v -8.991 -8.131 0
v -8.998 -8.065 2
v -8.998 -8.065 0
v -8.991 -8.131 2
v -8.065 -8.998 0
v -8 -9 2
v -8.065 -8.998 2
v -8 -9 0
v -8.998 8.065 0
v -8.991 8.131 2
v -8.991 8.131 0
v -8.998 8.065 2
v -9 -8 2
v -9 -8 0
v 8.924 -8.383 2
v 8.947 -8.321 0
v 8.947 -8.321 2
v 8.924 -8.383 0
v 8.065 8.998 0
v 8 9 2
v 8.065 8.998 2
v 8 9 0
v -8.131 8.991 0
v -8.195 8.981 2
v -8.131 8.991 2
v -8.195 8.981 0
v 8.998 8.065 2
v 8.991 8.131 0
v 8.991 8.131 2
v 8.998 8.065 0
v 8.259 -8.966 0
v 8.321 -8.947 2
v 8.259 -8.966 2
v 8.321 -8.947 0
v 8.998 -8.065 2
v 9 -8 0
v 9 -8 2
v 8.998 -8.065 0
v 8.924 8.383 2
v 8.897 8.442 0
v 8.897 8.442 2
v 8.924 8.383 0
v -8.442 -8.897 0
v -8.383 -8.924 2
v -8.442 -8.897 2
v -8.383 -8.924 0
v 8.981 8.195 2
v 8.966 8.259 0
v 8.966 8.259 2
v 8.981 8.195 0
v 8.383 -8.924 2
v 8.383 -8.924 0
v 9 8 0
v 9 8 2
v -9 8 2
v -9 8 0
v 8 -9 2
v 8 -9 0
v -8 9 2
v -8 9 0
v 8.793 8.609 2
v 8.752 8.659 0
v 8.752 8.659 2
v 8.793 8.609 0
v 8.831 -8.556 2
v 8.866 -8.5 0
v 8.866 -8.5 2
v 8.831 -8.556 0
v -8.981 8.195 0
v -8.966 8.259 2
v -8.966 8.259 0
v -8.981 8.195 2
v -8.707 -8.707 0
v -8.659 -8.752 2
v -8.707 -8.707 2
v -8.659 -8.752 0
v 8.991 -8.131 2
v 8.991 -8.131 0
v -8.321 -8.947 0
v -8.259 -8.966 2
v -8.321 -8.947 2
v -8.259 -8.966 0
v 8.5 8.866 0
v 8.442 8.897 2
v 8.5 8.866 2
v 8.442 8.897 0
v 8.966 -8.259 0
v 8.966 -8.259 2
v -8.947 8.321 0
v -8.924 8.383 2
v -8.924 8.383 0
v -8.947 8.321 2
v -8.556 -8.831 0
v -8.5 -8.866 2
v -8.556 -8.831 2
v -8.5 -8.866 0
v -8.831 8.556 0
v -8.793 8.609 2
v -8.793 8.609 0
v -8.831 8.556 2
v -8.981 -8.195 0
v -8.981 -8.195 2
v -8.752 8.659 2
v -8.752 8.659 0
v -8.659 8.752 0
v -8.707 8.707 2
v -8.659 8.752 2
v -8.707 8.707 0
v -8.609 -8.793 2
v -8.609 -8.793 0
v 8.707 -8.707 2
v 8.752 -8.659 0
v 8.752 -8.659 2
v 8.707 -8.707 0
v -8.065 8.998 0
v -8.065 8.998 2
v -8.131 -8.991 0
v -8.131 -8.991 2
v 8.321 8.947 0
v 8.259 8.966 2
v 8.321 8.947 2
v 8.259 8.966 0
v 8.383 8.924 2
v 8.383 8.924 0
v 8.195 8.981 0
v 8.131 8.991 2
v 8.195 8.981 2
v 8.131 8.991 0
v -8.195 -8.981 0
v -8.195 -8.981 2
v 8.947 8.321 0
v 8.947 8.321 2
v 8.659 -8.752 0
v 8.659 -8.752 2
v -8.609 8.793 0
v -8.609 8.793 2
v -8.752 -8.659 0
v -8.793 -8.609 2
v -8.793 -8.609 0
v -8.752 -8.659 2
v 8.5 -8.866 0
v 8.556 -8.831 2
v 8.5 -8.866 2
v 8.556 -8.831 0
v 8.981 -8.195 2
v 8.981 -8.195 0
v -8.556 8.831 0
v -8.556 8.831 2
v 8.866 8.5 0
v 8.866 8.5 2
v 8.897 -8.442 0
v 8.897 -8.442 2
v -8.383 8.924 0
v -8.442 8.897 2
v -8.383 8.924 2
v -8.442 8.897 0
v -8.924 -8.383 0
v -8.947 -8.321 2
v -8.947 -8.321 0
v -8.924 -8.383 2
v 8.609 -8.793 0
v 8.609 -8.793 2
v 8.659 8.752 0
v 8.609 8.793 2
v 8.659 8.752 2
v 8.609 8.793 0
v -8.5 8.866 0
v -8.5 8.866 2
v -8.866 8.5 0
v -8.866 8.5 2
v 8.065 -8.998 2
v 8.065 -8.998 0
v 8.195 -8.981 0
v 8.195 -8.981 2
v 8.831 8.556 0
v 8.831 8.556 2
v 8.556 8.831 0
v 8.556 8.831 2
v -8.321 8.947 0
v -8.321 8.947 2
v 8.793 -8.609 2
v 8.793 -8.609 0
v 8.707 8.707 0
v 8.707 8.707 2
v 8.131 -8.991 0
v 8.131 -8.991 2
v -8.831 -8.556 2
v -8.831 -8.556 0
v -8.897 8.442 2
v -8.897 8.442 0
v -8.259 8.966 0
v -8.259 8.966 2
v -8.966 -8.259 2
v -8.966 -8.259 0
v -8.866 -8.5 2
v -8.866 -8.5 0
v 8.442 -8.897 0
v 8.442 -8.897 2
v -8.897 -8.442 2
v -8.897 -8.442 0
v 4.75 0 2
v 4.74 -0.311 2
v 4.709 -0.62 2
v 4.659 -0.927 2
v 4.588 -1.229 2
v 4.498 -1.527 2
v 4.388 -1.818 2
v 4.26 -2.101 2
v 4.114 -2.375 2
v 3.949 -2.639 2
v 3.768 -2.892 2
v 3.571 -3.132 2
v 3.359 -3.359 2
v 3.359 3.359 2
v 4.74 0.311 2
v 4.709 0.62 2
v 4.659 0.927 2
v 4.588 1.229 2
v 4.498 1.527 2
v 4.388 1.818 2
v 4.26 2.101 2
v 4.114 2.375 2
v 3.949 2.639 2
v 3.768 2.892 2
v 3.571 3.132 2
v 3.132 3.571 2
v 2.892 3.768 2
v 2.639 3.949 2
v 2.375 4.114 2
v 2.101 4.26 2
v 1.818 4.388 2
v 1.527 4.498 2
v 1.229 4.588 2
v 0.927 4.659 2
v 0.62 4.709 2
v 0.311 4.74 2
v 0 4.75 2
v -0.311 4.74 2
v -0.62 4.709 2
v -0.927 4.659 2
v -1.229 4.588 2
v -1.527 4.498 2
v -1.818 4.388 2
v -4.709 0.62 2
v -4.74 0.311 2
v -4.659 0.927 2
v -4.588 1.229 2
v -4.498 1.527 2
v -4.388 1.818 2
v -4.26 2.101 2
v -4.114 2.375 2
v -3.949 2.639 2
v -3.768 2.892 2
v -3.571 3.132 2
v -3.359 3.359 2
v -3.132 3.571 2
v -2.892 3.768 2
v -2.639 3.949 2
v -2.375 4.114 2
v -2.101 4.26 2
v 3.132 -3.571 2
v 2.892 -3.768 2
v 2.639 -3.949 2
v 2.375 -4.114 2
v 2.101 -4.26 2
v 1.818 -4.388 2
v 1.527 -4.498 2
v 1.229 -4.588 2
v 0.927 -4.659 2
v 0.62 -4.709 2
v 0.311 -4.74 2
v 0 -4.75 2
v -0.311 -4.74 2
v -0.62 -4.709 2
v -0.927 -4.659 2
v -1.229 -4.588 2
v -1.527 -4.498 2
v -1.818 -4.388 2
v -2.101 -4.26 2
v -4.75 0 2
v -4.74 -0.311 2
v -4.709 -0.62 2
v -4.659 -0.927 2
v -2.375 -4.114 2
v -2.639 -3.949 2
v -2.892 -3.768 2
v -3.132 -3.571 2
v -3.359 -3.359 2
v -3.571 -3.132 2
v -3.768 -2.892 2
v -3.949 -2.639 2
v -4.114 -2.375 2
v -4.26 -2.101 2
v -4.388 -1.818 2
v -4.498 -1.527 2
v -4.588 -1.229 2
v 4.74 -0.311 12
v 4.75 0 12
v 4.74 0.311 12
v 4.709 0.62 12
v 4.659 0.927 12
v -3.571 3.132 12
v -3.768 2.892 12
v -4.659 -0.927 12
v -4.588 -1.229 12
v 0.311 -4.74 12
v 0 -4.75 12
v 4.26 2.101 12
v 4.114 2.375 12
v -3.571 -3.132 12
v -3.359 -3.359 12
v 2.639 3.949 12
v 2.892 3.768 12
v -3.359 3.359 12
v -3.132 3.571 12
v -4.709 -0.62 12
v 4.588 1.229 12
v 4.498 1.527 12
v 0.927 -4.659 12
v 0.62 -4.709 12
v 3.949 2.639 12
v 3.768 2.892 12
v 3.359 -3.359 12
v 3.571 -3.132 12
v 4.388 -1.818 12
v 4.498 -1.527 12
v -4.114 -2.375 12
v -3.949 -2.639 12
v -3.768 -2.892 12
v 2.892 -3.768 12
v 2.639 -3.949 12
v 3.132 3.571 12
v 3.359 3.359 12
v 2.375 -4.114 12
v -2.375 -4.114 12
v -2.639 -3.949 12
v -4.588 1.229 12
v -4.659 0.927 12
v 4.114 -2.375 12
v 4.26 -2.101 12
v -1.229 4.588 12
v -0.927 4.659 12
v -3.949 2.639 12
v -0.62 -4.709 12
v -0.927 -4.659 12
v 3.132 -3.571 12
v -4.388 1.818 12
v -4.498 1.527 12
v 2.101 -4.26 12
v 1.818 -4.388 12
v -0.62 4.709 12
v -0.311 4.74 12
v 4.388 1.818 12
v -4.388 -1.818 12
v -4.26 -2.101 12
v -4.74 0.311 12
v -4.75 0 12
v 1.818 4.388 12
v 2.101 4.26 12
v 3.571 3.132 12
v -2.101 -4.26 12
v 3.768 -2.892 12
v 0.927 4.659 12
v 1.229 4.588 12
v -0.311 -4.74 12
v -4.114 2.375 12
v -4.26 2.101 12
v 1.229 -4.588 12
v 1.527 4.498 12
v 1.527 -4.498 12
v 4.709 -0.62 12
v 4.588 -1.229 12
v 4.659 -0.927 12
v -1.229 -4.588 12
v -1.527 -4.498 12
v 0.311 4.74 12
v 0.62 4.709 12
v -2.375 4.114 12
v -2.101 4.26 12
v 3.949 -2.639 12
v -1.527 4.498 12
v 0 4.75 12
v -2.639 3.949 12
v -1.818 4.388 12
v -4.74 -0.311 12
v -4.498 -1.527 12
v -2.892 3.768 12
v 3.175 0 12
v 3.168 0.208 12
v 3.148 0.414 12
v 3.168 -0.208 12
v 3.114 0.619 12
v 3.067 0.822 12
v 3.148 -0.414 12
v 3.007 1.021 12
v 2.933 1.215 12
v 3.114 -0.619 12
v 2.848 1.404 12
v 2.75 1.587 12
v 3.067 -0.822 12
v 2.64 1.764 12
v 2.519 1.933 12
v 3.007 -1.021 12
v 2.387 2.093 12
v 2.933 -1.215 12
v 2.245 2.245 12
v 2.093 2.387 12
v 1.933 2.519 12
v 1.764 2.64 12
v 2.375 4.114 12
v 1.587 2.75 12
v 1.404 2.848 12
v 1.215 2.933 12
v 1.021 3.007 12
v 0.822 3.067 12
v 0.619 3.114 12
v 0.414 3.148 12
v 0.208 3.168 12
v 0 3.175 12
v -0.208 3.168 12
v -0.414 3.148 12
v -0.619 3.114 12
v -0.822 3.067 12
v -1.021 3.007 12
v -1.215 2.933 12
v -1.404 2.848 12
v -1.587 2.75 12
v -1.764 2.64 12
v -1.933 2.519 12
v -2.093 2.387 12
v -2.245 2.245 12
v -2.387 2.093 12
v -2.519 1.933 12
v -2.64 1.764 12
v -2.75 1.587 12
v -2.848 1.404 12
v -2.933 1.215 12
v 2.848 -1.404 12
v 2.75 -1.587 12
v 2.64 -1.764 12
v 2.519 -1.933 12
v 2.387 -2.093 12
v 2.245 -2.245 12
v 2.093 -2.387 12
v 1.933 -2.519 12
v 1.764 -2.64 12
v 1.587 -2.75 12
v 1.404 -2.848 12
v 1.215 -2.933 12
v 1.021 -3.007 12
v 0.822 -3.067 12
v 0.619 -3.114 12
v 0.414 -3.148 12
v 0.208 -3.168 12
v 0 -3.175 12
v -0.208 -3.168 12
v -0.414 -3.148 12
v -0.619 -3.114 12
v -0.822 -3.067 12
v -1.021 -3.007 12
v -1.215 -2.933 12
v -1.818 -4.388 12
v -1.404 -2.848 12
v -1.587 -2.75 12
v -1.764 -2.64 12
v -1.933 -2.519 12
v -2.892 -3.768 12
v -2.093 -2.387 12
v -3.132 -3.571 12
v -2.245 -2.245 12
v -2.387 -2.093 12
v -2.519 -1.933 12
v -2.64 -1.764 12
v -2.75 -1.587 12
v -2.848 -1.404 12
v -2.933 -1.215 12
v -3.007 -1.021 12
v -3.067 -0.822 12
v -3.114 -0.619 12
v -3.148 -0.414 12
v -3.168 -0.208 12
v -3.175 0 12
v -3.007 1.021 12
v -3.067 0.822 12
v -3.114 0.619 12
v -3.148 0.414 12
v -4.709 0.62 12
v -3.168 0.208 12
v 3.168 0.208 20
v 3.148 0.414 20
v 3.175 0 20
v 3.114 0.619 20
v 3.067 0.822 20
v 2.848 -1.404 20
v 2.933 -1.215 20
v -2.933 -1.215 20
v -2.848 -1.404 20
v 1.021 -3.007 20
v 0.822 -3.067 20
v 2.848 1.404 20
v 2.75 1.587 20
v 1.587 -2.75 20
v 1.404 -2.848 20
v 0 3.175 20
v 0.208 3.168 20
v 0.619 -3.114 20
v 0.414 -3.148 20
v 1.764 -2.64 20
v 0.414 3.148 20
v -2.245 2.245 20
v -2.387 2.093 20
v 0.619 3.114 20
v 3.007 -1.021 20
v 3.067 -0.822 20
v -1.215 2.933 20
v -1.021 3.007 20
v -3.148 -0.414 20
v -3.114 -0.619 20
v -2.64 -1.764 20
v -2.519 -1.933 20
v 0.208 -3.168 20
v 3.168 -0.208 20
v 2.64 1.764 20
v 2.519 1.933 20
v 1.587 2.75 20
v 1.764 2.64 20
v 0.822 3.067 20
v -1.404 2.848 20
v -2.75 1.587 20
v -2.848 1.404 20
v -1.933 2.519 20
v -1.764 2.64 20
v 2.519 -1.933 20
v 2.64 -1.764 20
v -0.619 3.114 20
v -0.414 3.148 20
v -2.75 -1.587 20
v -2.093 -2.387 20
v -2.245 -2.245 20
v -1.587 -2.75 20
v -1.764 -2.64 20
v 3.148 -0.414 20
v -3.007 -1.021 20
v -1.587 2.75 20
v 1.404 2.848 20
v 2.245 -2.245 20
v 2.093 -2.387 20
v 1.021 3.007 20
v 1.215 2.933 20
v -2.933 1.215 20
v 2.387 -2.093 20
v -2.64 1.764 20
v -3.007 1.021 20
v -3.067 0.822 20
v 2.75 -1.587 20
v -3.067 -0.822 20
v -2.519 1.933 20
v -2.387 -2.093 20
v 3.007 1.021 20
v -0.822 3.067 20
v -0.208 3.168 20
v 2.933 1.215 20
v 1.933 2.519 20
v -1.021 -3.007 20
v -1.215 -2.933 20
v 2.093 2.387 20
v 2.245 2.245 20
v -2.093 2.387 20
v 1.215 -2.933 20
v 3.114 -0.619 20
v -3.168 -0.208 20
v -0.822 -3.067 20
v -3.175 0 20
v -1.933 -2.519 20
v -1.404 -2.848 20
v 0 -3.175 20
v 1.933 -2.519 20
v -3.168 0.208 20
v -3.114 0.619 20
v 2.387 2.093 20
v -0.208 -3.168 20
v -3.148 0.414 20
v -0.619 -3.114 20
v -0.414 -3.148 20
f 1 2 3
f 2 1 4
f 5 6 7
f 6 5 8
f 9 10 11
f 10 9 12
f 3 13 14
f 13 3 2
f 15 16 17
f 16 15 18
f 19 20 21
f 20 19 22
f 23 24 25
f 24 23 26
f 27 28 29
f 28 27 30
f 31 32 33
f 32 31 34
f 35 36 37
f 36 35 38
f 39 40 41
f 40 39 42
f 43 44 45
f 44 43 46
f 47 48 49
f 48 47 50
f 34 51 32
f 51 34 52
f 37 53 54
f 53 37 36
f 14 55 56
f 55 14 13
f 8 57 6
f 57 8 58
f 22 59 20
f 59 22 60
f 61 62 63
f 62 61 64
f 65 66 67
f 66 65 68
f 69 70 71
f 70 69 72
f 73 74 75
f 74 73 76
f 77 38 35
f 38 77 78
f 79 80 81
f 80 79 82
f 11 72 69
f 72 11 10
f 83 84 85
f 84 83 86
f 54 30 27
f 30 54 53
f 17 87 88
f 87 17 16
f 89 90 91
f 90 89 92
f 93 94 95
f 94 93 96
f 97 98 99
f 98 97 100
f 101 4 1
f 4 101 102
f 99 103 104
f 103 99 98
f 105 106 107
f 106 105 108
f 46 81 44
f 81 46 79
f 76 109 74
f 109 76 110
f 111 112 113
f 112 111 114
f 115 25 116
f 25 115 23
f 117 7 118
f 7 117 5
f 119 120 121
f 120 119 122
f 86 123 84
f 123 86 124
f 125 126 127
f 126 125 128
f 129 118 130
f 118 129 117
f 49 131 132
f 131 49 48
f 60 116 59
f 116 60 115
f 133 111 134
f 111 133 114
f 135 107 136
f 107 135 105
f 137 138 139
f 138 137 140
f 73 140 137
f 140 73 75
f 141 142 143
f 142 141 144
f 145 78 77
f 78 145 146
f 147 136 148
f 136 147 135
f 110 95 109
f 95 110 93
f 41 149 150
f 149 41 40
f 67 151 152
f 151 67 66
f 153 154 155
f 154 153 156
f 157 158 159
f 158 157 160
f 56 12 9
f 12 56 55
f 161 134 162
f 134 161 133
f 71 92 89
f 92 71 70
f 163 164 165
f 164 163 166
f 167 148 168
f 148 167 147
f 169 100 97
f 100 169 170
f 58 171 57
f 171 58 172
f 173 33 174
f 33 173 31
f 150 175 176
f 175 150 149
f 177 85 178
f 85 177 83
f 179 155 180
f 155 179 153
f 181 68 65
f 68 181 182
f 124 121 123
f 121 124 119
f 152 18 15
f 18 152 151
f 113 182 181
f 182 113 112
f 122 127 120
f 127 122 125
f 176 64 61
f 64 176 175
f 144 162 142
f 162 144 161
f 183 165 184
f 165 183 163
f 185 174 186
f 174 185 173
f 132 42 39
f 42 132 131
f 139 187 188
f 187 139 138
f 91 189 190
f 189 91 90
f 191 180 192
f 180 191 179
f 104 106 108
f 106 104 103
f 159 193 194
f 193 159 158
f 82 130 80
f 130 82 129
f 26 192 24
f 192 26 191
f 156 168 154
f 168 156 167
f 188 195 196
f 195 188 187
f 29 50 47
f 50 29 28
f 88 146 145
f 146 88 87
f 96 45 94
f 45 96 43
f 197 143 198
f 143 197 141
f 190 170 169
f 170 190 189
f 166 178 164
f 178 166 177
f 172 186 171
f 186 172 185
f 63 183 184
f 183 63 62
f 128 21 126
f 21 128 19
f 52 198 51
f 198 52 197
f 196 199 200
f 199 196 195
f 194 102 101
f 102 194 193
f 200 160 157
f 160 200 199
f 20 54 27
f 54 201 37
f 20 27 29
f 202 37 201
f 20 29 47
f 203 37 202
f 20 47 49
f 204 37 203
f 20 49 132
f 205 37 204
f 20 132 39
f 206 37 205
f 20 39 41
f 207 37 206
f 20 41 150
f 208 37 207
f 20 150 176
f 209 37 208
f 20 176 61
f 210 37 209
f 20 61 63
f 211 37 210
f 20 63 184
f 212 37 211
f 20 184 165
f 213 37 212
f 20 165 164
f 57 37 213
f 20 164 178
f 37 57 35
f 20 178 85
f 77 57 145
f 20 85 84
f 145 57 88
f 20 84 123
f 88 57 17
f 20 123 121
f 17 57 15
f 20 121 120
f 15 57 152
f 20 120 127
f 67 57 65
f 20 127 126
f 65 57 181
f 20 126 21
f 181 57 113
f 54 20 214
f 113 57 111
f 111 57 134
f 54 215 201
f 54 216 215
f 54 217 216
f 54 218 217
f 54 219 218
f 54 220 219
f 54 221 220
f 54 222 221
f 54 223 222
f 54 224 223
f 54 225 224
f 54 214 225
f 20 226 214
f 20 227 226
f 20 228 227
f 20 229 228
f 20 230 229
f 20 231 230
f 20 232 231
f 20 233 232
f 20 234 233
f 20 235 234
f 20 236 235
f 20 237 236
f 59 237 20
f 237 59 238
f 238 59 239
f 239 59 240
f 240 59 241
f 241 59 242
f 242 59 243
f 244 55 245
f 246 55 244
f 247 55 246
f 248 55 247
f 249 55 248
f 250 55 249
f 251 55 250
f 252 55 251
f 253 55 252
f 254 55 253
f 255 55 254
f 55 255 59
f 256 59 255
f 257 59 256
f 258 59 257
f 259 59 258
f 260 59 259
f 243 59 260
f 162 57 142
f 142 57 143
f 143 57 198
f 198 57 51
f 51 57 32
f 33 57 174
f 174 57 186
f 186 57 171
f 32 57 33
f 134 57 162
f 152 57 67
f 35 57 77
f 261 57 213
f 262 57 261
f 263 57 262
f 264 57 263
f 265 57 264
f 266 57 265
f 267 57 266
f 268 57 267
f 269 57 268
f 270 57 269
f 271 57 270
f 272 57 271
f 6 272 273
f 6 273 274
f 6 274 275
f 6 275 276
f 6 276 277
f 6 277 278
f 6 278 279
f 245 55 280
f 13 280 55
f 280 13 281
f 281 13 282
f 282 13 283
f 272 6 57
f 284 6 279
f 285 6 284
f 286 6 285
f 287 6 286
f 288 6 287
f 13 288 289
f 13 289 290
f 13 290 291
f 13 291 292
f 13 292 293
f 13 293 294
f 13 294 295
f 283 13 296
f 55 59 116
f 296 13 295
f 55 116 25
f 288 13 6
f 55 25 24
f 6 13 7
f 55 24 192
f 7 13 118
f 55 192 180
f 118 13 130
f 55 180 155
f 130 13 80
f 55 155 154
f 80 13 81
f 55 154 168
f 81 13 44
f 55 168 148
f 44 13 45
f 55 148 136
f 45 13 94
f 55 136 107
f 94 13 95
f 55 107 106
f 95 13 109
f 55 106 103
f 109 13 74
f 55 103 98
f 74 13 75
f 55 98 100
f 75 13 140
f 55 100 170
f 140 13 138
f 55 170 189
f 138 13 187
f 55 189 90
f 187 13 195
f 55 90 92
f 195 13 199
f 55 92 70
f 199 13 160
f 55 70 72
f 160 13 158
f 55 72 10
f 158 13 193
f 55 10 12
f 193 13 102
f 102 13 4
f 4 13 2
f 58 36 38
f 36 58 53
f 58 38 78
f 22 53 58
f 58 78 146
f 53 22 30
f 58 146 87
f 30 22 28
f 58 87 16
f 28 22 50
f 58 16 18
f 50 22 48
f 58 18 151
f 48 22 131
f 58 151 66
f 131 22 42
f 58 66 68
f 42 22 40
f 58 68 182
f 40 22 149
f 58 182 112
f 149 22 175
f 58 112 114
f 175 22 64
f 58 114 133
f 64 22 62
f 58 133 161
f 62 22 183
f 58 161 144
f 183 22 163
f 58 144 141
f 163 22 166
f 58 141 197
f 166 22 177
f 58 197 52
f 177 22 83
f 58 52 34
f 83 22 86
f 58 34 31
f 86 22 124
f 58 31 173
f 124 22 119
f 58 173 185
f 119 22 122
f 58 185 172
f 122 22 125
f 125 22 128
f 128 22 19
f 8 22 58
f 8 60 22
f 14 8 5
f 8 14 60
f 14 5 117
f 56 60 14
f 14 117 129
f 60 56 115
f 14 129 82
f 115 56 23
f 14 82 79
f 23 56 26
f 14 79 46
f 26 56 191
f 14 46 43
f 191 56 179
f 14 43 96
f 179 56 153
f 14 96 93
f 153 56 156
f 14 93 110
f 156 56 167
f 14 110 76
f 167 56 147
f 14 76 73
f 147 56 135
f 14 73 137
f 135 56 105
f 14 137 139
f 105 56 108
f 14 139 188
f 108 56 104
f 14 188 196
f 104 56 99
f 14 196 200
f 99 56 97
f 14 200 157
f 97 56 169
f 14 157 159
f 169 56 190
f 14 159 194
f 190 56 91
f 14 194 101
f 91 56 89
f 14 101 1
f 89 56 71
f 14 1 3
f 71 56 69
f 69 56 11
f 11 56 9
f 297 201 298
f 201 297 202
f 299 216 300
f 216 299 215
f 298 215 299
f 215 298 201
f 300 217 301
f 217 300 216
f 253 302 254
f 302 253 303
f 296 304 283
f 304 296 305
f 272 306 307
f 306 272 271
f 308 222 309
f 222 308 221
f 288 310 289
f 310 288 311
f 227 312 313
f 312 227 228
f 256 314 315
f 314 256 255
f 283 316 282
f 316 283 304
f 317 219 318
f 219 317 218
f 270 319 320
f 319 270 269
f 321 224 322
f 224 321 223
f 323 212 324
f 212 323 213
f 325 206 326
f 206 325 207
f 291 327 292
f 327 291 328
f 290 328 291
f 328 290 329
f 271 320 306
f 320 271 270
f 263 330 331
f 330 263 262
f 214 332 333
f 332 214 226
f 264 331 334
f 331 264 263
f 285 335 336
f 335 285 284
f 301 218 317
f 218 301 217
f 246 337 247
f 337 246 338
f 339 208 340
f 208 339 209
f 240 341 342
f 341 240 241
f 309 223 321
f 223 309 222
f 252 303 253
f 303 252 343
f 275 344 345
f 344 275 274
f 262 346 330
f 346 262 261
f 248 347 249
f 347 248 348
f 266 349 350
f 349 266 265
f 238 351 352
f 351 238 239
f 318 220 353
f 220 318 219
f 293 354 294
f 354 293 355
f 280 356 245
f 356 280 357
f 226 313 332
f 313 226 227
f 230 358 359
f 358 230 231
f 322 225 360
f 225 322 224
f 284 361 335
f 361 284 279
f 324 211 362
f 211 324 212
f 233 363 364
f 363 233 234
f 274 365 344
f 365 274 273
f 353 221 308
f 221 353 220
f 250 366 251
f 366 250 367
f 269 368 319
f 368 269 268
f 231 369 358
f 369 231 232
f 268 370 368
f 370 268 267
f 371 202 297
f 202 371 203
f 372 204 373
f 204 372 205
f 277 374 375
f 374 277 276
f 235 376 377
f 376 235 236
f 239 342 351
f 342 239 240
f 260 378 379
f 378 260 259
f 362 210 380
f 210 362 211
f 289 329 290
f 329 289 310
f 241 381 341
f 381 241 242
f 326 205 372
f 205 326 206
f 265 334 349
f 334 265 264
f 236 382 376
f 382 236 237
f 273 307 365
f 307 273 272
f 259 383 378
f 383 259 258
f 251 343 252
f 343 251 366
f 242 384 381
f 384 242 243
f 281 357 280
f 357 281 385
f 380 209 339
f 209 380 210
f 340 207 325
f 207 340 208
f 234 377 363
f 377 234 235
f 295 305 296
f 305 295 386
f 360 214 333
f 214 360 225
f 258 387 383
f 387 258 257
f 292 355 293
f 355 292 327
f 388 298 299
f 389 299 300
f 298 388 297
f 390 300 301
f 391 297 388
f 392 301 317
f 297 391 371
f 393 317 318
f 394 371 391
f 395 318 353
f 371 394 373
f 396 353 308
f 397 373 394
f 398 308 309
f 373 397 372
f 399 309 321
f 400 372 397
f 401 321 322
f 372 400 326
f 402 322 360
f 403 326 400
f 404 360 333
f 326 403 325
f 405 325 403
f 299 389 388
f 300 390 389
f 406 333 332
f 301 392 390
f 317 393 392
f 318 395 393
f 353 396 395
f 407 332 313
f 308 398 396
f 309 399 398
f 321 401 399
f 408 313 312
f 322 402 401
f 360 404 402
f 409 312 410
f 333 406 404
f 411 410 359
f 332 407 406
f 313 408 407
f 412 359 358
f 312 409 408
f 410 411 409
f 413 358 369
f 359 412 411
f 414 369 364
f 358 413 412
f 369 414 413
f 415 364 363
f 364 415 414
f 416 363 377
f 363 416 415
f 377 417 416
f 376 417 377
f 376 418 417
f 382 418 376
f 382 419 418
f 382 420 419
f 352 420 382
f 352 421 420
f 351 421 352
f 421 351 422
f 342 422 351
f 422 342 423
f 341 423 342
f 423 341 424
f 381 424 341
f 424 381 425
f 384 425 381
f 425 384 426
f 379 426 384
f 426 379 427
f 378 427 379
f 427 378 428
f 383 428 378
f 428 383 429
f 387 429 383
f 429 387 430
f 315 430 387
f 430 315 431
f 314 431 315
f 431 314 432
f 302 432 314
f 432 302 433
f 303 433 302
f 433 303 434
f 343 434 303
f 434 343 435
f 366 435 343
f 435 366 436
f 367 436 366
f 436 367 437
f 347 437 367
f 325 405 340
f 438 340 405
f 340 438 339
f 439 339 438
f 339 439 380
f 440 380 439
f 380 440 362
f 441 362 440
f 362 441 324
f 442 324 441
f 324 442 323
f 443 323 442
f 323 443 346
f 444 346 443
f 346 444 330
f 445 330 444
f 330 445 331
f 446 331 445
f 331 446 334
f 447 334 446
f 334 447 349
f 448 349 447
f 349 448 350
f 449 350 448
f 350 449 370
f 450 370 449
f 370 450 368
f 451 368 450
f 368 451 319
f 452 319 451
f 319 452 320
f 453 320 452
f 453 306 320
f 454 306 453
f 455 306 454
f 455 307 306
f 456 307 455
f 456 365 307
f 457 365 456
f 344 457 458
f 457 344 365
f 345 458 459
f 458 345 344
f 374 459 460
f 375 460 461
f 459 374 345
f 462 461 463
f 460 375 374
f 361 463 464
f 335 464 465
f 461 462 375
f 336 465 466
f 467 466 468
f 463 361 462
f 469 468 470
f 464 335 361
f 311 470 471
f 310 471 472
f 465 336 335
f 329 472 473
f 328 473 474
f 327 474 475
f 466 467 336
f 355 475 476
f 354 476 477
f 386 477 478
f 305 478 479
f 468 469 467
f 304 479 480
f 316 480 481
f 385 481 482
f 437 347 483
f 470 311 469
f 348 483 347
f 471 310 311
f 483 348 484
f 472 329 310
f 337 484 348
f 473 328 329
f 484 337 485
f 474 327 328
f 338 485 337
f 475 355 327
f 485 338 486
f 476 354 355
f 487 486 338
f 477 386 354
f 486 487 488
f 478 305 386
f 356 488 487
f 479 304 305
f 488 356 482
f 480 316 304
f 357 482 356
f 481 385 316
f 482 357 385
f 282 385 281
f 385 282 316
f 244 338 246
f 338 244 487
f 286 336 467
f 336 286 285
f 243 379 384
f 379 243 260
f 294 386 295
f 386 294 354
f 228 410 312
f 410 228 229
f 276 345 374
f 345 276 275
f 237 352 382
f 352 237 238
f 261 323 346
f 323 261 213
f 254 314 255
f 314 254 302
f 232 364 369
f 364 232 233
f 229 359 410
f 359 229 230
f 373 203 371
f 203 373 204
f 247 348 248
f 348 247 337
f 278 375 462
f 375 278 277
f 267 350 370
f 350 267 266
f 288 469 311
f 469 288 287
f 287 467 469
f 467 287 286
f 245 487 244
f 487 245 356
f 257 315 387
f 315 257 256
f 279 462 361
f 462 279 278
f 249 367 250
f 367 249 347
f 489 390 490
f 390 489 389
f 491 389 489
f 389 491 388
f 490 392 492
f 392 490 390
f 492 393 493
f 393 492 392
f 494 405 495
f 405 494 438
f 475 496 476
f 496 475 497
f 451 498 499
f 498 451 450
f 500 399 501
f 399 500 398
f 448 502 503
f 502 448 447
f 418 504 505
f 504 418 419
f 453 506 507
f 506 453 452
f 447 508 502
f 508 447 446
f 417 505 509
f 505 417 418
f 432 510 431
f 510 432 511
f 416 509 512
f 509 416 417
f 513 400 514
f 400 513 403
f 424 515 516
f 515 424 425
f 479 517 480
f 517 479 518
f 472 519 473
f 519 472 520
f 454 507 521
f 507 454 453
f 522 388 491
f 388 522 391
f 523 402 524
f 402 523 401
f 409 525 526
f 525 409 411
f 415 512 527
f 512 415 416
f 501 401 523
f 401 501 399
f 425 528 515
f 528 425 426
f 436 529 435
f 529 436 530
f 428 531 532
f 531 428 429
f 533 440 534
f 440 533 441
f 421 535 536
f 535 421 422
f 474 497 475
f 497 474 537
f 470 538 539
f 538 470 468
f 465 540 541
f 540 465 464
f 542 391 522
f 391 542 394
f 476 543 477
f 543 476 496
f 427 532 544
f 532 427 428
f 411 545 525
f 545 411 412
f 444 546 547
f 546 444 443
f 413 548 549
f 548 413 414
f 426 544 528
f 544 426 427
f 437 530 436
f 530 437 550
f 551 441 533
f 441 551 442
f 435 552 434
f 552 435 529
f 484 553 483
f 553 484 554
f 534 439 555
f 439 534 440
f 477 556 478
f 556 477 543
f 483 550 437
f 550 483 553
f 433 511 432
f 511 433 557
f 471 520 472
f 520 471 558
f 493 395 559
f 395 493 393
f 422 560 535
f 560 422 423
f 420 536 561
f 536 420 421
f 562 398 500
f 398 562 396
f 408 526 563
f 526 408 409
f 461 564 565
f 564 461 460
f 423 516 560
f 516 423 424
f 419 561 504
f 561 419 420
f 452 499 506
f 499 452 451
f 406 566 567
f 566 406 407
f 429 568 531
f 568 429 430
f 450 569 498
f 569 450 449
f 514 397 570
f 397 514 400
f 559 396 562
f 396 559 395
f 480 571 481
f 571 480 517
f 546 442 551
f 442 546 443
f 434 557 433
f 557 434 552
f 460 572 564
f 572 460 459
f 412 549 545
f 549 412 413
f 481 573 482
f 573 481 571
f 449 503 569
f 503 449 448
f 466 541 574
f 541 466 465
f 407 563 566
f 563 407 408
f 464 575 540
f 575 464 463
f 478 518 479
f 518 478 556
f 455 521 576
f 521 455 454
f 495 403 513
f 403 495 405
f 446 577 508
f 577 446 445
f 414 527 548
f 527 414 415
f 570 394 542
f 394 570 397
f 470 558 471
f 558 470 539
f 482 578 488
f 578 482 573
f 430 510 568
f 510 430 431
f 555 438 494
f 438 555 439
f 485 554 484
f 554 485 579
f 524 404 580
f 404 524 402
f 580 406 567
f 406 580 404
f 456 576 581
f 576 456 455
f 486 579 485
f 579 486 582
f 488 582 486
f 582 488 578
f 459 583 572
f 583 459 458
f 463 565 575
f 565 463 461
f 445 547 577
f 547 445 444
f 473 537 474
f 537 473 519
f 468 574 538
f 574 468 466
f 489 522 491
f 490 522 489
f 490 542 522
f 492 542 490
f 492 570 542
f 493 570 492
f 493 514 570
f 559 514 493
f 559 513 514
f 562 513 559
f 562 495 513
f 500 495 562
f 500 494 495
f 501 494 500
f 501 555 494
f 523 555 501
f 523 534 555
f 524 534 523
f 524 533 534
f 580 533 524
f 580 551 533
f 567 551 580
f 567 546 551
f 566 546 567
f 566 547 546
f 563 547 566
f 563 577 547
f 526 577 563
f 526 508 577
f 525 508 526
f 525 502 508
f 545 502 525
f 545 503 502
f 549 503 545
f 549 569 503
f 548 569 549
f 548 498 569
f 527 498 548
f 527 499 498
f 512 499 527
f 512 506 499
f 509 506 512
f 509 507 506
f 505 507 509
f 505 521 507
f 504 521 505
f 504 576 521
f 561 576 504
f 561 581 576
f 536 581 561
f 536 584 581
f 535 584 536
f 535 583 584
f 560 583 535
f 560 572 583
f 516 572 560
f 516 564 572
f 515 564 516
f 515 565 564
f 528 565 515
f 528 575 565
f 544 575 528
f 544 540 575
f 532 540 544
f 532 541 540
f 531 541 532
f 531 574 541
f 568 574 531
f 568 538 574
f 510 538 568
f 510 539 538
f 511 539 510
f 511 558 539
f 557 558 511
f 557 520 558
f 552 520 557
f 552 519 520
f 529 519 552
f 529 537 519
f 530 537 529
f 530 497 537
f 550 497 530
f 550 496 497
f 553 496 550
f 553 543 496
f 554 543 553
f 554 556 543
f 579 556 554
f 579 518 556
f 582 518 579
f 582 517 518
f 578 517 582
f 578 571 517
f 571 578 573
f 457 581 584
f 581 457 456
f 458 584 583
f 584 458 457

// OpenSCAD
/* ---------------------------------------------------------------------------
   Cold shoe stud -- purchased-hardware standin for the square-flange, two-
   step threaded stud that slides into a cold shoe channel: a
   thin square plate with a 3/8" post rising from it, and a 1/4" post rising
   further from the top of that post (the common flash-stud / umbrella-screw
   shape -- see reference photo). Thread geometry is skipped by request:
   both posts are plain cylinders standing in for the 3/8"-16 and 1/4"-20
   threaded sections, not modeled threads.

   The flange is fixed (not a Customizer setting) to fit a standard ISO 518
   accessory shoe; see the [Hidden] group. The post dimensions are
   approximate, chosen to read as the right size in the rig_assembly.scad
   mockup, not measured from the purchased stud.

   Coordinate convention: origin centred on the flange in X/Y. Z0 = the
   underside of the flange (the face that rests on the shoe's channel
   floor); both posts rise in +Z from there, the 3/8" post first and the
   1/4" post stacked on top of it.

   Purchased-hardware standin, not a printed structural part -- no
   [Build Plate] or [Revision] group, same reasoning as `t_slot_bolt.scad`.

   REV 1.0: initial.
   REV 1.1: comments only; dropped references to the removed cold_shoe.scad.
   REV 1.2: flange width and thickness fixed to ISO 518 shoe limits, moved
            to [Hidden].
   --------------------------------------------------------------------------- */

/* [Plate] */
corner_r  = 1;    // corner rounding on the flange, mm (0 = square corners)  [0:0.25:3]

/* [Stud] */
c38_dia = 9.5;   // 3/8" post diameter standin, mm (3/8 in = 9.525mm)  [6:0.5:12]
c38_len = 10;    // 3/8" post height above the plate, mm  [4:0.5:20]
qtr_dia = 6.35;  // 1/4" post diameter standin, mm (1/4 in = 6.35mm)  [4:0.25:8]
qtr_len = 8;     // 1/4" post height above the 3/8" post, mm  [3:0.5:16]

/* [Render] */
$fn = $preview ? 32 : 96;
eps = 0.01;

/* [Hidden] */
// Flange fixed to fit an ISO 518 shoe: inside width 18.6 mm (+0.2/-0), gap
// between the lips 12.5 mm (+0.4/-0), slot height 2 mm (+0.15/-0). ISO 518
// does not give foot dimensions; these fit those shoe limits.
plate_w   = 18;   // square flange width, mm: under 18.6, over 12.5
plate_thk = 2;    // flange thickness, mm: the slot's minimum height

// ---------------------------------------------------------------------------

module rounded_square(w, r) {
    // plan view (XY): square of side w, centred, corners rounded to r
    hull() for (sx = [-1, 1], sy = [-1, 1])
        translate([sx * (w / 2 - r), sy * (w / 2 - r)]) circle(r);
}

module cold_shoe_stud() {
color("DimGray") {
    linear_extrude(plate_thk) rounded_square(plate_w, corner_r);

    translate([0, 0, plate_thk - eps])
        cylinder(d = c38_dia, h = c38_len + eps);

    translate([0, 0, plate_thk + c38_len - eps])
        cylinder(d = qtr_dia, h = qtr_len + eps);
    }
}

cold_shoe_stud();
